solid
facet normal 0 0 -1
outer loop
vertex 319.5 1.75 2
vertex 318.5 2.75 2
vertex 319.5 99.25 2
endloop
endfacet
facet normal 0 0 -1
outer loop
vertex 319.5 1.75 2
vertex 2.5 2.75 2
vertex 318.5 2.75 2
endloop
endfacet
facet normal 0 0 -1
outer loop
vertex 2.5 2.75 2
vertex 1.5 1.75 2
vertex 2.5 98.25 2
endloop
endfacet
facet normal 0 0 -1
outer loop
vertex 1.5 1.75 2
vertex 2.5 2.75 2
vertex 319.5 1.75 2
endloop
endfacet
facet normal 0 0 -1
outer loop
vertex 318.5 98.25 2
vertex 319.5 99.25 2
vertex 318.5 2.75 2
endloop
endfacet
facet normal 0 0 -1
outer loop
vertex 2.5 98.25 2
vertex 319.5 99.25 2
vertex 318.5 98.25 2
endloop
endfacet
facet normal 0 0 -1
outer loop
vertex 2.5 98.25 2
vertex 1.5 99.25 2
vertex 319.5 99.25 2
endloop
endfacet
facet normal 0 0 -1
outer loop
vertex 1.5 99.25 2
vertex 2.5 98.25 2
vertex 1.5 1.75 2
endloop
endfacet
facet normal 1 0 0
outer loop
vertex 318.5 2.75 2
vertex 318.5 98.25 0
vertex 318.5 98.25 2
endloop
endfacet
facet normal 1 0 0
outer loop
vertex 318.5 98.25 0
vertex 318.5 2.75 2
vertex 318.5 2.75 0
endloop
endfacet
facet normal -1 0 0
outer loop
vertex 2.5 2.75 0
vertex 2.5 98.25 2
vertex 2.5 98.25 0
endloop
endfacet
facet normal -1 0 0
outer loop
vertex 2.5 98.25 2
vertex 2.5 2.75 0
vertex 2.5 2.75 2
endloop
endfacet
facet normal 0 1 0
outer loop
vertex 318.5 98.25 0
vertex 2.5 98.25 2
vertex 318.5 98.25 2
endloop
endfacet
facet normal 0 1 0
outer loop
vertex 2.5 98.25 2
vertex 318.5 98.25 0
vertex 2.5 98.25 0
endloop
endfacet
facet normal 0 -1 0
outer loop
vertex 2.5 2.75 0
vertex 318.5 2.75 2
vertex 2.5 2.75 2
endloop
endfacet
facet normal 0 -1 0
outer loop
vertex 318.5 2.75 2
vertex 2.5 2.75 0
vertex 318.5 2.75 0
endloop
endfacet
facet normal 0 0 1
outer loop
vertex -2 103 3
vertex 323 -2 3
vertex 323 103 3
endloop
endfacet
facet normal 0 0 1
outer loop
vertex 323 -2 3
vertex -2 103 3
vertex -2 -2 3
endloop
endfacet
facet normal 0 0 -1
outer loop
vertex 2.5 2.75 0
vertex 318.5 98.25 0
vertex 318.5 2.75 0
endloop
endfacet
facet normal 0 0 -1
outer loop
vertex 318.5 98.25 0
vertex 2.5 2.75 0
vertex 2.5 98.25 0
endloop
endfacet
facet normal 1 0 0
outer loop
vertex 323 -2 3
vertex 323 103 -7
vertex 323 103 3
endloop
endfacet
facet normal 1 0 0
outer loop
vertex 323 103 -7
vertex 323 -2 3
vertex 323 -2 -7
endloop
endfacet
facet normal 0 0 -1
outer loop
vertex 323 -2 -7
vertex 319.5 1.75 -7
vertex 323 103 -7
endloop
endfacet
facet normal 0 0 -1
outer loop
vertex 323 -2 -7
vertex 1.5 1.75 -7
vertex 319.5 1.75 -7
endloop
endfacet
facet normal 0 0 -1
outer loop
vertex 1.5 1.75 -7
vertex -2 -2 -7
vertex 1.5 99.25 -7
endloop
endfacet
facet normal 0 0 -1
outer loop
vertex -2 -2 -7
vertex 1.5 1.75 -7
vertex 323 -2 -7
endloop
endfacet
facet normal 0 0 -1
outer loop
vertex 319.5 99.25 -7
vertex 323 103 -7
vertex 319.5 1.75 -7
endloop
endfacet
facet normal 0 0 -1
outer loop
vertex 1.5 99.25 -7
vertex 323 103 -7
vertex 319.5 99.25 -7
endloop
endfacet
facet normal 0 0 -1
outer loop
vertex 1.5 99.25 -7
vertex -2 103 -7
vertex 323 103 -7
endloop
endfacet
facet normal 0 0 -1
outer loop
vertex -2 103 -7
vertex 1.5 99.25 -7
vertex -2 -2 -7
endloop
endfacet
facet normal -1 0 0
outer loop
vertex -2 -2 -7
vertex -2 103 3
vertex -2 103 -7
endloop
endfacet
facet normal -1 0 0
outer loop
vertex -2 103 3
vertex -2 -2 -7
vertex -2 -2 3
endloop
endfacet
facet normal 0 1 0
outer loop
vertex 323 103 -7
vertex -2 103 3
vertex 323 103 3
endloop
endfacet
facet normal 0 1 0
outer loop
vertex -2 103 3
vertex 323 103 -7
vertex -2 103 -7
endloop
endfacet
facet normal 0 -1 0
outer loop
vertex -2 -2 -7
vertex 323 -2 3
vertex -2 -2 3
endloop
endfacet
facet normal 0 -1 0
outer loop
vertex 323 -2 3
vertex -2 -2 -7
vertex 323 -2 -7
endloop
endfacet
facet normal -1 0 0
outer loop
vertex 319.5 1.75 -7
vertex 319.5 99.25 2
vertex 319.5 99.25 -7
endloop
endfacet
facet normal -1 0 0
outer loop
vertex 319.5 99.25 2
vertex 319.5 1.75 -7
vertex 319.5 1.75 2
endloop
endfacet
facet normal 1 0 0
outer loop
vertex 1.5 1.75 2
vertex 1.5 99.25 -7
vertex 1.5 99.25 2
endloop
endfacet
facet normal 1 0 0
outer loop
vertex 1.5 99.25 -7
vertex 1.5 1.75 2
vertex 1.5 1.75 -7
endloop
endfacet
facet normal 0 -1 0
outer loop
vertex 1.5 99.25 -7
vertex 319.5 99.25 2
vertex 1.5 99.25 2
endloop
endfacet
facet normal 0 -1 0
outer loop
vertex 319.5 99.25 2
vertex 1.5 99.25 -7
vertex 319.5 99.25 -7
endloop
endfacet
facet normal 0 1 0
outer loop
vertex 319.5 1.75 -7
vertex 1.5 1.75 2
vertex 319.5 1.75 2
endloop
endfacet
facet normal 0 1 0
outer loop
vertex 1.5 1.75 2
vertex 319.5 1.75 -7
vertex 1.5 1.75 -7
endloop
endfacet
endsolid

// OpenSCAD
// parameters for box covered by this module
X_OUTER = 321;
Y_OUTER = 101;
X_INNER = 316;
Y_INNER = 95.5;

// parameters for cover
PLATE_CHICKNESS = 3;
WALL_CHICKNESS = 2;
WALL_HEIGHT = 10;


module Frame(x_outer=20, y_outer=10, x_inner=18, y_inner=8, chickness=1) {
    difference() {
        cube([x_outer, y_outer, chickness]);
        translate([(x_outer-x_inner)/2, (y_outer-y_inner)/2, 0])
            cube([x_inner, y_inner, chickness]);
    }
}

module CoverForBox(
    x_outer=20,
    y_outer=10,
    x_inner=18,
    y_inner=8,
    box_wall_chickness=2,
    top_plate_chickness=3,
    wall_chickness=2,
    wall_height=10
) {
    difference() {
        cube([x_outer, y_outer, top_plate_chickness]);
        
        // groove for box wall
        translate([0, 0, -1]) {
            Frame(
                x_outer=x_outer,
                y_outer=y_outer,
                x_inner=x_inner,
                y_inner=y_inner,
                chickness=top_plate_chickness
            );
        }
    }

    // vertical wall
    translate([
        -wall_chickness,
        -wall_chickness,
        -wall_height+top_plate_chickness
    ])
    Frame(
        x_outer=x_outer+wall_chickness*2,
        y_outer=y_outer+wall_chickness*2,
        x_inner=x_inner+box_wall_chickness,
        y_inner=y_inner+box_wall_chickness,
        chickness=wall_height
    );
}

// main
CoverForBox(
    x_outer=X_OUTER, 
    y_outer=Y_OUTER,
    x_inner=X_INNER,
    y_inner=Y_INNER,
    top_plate_chickness=PLATE_CHICKNESS,
    wall_chickness=WALL_CHICKNESS,
    wall_height=WALL_HEIGHT
);
